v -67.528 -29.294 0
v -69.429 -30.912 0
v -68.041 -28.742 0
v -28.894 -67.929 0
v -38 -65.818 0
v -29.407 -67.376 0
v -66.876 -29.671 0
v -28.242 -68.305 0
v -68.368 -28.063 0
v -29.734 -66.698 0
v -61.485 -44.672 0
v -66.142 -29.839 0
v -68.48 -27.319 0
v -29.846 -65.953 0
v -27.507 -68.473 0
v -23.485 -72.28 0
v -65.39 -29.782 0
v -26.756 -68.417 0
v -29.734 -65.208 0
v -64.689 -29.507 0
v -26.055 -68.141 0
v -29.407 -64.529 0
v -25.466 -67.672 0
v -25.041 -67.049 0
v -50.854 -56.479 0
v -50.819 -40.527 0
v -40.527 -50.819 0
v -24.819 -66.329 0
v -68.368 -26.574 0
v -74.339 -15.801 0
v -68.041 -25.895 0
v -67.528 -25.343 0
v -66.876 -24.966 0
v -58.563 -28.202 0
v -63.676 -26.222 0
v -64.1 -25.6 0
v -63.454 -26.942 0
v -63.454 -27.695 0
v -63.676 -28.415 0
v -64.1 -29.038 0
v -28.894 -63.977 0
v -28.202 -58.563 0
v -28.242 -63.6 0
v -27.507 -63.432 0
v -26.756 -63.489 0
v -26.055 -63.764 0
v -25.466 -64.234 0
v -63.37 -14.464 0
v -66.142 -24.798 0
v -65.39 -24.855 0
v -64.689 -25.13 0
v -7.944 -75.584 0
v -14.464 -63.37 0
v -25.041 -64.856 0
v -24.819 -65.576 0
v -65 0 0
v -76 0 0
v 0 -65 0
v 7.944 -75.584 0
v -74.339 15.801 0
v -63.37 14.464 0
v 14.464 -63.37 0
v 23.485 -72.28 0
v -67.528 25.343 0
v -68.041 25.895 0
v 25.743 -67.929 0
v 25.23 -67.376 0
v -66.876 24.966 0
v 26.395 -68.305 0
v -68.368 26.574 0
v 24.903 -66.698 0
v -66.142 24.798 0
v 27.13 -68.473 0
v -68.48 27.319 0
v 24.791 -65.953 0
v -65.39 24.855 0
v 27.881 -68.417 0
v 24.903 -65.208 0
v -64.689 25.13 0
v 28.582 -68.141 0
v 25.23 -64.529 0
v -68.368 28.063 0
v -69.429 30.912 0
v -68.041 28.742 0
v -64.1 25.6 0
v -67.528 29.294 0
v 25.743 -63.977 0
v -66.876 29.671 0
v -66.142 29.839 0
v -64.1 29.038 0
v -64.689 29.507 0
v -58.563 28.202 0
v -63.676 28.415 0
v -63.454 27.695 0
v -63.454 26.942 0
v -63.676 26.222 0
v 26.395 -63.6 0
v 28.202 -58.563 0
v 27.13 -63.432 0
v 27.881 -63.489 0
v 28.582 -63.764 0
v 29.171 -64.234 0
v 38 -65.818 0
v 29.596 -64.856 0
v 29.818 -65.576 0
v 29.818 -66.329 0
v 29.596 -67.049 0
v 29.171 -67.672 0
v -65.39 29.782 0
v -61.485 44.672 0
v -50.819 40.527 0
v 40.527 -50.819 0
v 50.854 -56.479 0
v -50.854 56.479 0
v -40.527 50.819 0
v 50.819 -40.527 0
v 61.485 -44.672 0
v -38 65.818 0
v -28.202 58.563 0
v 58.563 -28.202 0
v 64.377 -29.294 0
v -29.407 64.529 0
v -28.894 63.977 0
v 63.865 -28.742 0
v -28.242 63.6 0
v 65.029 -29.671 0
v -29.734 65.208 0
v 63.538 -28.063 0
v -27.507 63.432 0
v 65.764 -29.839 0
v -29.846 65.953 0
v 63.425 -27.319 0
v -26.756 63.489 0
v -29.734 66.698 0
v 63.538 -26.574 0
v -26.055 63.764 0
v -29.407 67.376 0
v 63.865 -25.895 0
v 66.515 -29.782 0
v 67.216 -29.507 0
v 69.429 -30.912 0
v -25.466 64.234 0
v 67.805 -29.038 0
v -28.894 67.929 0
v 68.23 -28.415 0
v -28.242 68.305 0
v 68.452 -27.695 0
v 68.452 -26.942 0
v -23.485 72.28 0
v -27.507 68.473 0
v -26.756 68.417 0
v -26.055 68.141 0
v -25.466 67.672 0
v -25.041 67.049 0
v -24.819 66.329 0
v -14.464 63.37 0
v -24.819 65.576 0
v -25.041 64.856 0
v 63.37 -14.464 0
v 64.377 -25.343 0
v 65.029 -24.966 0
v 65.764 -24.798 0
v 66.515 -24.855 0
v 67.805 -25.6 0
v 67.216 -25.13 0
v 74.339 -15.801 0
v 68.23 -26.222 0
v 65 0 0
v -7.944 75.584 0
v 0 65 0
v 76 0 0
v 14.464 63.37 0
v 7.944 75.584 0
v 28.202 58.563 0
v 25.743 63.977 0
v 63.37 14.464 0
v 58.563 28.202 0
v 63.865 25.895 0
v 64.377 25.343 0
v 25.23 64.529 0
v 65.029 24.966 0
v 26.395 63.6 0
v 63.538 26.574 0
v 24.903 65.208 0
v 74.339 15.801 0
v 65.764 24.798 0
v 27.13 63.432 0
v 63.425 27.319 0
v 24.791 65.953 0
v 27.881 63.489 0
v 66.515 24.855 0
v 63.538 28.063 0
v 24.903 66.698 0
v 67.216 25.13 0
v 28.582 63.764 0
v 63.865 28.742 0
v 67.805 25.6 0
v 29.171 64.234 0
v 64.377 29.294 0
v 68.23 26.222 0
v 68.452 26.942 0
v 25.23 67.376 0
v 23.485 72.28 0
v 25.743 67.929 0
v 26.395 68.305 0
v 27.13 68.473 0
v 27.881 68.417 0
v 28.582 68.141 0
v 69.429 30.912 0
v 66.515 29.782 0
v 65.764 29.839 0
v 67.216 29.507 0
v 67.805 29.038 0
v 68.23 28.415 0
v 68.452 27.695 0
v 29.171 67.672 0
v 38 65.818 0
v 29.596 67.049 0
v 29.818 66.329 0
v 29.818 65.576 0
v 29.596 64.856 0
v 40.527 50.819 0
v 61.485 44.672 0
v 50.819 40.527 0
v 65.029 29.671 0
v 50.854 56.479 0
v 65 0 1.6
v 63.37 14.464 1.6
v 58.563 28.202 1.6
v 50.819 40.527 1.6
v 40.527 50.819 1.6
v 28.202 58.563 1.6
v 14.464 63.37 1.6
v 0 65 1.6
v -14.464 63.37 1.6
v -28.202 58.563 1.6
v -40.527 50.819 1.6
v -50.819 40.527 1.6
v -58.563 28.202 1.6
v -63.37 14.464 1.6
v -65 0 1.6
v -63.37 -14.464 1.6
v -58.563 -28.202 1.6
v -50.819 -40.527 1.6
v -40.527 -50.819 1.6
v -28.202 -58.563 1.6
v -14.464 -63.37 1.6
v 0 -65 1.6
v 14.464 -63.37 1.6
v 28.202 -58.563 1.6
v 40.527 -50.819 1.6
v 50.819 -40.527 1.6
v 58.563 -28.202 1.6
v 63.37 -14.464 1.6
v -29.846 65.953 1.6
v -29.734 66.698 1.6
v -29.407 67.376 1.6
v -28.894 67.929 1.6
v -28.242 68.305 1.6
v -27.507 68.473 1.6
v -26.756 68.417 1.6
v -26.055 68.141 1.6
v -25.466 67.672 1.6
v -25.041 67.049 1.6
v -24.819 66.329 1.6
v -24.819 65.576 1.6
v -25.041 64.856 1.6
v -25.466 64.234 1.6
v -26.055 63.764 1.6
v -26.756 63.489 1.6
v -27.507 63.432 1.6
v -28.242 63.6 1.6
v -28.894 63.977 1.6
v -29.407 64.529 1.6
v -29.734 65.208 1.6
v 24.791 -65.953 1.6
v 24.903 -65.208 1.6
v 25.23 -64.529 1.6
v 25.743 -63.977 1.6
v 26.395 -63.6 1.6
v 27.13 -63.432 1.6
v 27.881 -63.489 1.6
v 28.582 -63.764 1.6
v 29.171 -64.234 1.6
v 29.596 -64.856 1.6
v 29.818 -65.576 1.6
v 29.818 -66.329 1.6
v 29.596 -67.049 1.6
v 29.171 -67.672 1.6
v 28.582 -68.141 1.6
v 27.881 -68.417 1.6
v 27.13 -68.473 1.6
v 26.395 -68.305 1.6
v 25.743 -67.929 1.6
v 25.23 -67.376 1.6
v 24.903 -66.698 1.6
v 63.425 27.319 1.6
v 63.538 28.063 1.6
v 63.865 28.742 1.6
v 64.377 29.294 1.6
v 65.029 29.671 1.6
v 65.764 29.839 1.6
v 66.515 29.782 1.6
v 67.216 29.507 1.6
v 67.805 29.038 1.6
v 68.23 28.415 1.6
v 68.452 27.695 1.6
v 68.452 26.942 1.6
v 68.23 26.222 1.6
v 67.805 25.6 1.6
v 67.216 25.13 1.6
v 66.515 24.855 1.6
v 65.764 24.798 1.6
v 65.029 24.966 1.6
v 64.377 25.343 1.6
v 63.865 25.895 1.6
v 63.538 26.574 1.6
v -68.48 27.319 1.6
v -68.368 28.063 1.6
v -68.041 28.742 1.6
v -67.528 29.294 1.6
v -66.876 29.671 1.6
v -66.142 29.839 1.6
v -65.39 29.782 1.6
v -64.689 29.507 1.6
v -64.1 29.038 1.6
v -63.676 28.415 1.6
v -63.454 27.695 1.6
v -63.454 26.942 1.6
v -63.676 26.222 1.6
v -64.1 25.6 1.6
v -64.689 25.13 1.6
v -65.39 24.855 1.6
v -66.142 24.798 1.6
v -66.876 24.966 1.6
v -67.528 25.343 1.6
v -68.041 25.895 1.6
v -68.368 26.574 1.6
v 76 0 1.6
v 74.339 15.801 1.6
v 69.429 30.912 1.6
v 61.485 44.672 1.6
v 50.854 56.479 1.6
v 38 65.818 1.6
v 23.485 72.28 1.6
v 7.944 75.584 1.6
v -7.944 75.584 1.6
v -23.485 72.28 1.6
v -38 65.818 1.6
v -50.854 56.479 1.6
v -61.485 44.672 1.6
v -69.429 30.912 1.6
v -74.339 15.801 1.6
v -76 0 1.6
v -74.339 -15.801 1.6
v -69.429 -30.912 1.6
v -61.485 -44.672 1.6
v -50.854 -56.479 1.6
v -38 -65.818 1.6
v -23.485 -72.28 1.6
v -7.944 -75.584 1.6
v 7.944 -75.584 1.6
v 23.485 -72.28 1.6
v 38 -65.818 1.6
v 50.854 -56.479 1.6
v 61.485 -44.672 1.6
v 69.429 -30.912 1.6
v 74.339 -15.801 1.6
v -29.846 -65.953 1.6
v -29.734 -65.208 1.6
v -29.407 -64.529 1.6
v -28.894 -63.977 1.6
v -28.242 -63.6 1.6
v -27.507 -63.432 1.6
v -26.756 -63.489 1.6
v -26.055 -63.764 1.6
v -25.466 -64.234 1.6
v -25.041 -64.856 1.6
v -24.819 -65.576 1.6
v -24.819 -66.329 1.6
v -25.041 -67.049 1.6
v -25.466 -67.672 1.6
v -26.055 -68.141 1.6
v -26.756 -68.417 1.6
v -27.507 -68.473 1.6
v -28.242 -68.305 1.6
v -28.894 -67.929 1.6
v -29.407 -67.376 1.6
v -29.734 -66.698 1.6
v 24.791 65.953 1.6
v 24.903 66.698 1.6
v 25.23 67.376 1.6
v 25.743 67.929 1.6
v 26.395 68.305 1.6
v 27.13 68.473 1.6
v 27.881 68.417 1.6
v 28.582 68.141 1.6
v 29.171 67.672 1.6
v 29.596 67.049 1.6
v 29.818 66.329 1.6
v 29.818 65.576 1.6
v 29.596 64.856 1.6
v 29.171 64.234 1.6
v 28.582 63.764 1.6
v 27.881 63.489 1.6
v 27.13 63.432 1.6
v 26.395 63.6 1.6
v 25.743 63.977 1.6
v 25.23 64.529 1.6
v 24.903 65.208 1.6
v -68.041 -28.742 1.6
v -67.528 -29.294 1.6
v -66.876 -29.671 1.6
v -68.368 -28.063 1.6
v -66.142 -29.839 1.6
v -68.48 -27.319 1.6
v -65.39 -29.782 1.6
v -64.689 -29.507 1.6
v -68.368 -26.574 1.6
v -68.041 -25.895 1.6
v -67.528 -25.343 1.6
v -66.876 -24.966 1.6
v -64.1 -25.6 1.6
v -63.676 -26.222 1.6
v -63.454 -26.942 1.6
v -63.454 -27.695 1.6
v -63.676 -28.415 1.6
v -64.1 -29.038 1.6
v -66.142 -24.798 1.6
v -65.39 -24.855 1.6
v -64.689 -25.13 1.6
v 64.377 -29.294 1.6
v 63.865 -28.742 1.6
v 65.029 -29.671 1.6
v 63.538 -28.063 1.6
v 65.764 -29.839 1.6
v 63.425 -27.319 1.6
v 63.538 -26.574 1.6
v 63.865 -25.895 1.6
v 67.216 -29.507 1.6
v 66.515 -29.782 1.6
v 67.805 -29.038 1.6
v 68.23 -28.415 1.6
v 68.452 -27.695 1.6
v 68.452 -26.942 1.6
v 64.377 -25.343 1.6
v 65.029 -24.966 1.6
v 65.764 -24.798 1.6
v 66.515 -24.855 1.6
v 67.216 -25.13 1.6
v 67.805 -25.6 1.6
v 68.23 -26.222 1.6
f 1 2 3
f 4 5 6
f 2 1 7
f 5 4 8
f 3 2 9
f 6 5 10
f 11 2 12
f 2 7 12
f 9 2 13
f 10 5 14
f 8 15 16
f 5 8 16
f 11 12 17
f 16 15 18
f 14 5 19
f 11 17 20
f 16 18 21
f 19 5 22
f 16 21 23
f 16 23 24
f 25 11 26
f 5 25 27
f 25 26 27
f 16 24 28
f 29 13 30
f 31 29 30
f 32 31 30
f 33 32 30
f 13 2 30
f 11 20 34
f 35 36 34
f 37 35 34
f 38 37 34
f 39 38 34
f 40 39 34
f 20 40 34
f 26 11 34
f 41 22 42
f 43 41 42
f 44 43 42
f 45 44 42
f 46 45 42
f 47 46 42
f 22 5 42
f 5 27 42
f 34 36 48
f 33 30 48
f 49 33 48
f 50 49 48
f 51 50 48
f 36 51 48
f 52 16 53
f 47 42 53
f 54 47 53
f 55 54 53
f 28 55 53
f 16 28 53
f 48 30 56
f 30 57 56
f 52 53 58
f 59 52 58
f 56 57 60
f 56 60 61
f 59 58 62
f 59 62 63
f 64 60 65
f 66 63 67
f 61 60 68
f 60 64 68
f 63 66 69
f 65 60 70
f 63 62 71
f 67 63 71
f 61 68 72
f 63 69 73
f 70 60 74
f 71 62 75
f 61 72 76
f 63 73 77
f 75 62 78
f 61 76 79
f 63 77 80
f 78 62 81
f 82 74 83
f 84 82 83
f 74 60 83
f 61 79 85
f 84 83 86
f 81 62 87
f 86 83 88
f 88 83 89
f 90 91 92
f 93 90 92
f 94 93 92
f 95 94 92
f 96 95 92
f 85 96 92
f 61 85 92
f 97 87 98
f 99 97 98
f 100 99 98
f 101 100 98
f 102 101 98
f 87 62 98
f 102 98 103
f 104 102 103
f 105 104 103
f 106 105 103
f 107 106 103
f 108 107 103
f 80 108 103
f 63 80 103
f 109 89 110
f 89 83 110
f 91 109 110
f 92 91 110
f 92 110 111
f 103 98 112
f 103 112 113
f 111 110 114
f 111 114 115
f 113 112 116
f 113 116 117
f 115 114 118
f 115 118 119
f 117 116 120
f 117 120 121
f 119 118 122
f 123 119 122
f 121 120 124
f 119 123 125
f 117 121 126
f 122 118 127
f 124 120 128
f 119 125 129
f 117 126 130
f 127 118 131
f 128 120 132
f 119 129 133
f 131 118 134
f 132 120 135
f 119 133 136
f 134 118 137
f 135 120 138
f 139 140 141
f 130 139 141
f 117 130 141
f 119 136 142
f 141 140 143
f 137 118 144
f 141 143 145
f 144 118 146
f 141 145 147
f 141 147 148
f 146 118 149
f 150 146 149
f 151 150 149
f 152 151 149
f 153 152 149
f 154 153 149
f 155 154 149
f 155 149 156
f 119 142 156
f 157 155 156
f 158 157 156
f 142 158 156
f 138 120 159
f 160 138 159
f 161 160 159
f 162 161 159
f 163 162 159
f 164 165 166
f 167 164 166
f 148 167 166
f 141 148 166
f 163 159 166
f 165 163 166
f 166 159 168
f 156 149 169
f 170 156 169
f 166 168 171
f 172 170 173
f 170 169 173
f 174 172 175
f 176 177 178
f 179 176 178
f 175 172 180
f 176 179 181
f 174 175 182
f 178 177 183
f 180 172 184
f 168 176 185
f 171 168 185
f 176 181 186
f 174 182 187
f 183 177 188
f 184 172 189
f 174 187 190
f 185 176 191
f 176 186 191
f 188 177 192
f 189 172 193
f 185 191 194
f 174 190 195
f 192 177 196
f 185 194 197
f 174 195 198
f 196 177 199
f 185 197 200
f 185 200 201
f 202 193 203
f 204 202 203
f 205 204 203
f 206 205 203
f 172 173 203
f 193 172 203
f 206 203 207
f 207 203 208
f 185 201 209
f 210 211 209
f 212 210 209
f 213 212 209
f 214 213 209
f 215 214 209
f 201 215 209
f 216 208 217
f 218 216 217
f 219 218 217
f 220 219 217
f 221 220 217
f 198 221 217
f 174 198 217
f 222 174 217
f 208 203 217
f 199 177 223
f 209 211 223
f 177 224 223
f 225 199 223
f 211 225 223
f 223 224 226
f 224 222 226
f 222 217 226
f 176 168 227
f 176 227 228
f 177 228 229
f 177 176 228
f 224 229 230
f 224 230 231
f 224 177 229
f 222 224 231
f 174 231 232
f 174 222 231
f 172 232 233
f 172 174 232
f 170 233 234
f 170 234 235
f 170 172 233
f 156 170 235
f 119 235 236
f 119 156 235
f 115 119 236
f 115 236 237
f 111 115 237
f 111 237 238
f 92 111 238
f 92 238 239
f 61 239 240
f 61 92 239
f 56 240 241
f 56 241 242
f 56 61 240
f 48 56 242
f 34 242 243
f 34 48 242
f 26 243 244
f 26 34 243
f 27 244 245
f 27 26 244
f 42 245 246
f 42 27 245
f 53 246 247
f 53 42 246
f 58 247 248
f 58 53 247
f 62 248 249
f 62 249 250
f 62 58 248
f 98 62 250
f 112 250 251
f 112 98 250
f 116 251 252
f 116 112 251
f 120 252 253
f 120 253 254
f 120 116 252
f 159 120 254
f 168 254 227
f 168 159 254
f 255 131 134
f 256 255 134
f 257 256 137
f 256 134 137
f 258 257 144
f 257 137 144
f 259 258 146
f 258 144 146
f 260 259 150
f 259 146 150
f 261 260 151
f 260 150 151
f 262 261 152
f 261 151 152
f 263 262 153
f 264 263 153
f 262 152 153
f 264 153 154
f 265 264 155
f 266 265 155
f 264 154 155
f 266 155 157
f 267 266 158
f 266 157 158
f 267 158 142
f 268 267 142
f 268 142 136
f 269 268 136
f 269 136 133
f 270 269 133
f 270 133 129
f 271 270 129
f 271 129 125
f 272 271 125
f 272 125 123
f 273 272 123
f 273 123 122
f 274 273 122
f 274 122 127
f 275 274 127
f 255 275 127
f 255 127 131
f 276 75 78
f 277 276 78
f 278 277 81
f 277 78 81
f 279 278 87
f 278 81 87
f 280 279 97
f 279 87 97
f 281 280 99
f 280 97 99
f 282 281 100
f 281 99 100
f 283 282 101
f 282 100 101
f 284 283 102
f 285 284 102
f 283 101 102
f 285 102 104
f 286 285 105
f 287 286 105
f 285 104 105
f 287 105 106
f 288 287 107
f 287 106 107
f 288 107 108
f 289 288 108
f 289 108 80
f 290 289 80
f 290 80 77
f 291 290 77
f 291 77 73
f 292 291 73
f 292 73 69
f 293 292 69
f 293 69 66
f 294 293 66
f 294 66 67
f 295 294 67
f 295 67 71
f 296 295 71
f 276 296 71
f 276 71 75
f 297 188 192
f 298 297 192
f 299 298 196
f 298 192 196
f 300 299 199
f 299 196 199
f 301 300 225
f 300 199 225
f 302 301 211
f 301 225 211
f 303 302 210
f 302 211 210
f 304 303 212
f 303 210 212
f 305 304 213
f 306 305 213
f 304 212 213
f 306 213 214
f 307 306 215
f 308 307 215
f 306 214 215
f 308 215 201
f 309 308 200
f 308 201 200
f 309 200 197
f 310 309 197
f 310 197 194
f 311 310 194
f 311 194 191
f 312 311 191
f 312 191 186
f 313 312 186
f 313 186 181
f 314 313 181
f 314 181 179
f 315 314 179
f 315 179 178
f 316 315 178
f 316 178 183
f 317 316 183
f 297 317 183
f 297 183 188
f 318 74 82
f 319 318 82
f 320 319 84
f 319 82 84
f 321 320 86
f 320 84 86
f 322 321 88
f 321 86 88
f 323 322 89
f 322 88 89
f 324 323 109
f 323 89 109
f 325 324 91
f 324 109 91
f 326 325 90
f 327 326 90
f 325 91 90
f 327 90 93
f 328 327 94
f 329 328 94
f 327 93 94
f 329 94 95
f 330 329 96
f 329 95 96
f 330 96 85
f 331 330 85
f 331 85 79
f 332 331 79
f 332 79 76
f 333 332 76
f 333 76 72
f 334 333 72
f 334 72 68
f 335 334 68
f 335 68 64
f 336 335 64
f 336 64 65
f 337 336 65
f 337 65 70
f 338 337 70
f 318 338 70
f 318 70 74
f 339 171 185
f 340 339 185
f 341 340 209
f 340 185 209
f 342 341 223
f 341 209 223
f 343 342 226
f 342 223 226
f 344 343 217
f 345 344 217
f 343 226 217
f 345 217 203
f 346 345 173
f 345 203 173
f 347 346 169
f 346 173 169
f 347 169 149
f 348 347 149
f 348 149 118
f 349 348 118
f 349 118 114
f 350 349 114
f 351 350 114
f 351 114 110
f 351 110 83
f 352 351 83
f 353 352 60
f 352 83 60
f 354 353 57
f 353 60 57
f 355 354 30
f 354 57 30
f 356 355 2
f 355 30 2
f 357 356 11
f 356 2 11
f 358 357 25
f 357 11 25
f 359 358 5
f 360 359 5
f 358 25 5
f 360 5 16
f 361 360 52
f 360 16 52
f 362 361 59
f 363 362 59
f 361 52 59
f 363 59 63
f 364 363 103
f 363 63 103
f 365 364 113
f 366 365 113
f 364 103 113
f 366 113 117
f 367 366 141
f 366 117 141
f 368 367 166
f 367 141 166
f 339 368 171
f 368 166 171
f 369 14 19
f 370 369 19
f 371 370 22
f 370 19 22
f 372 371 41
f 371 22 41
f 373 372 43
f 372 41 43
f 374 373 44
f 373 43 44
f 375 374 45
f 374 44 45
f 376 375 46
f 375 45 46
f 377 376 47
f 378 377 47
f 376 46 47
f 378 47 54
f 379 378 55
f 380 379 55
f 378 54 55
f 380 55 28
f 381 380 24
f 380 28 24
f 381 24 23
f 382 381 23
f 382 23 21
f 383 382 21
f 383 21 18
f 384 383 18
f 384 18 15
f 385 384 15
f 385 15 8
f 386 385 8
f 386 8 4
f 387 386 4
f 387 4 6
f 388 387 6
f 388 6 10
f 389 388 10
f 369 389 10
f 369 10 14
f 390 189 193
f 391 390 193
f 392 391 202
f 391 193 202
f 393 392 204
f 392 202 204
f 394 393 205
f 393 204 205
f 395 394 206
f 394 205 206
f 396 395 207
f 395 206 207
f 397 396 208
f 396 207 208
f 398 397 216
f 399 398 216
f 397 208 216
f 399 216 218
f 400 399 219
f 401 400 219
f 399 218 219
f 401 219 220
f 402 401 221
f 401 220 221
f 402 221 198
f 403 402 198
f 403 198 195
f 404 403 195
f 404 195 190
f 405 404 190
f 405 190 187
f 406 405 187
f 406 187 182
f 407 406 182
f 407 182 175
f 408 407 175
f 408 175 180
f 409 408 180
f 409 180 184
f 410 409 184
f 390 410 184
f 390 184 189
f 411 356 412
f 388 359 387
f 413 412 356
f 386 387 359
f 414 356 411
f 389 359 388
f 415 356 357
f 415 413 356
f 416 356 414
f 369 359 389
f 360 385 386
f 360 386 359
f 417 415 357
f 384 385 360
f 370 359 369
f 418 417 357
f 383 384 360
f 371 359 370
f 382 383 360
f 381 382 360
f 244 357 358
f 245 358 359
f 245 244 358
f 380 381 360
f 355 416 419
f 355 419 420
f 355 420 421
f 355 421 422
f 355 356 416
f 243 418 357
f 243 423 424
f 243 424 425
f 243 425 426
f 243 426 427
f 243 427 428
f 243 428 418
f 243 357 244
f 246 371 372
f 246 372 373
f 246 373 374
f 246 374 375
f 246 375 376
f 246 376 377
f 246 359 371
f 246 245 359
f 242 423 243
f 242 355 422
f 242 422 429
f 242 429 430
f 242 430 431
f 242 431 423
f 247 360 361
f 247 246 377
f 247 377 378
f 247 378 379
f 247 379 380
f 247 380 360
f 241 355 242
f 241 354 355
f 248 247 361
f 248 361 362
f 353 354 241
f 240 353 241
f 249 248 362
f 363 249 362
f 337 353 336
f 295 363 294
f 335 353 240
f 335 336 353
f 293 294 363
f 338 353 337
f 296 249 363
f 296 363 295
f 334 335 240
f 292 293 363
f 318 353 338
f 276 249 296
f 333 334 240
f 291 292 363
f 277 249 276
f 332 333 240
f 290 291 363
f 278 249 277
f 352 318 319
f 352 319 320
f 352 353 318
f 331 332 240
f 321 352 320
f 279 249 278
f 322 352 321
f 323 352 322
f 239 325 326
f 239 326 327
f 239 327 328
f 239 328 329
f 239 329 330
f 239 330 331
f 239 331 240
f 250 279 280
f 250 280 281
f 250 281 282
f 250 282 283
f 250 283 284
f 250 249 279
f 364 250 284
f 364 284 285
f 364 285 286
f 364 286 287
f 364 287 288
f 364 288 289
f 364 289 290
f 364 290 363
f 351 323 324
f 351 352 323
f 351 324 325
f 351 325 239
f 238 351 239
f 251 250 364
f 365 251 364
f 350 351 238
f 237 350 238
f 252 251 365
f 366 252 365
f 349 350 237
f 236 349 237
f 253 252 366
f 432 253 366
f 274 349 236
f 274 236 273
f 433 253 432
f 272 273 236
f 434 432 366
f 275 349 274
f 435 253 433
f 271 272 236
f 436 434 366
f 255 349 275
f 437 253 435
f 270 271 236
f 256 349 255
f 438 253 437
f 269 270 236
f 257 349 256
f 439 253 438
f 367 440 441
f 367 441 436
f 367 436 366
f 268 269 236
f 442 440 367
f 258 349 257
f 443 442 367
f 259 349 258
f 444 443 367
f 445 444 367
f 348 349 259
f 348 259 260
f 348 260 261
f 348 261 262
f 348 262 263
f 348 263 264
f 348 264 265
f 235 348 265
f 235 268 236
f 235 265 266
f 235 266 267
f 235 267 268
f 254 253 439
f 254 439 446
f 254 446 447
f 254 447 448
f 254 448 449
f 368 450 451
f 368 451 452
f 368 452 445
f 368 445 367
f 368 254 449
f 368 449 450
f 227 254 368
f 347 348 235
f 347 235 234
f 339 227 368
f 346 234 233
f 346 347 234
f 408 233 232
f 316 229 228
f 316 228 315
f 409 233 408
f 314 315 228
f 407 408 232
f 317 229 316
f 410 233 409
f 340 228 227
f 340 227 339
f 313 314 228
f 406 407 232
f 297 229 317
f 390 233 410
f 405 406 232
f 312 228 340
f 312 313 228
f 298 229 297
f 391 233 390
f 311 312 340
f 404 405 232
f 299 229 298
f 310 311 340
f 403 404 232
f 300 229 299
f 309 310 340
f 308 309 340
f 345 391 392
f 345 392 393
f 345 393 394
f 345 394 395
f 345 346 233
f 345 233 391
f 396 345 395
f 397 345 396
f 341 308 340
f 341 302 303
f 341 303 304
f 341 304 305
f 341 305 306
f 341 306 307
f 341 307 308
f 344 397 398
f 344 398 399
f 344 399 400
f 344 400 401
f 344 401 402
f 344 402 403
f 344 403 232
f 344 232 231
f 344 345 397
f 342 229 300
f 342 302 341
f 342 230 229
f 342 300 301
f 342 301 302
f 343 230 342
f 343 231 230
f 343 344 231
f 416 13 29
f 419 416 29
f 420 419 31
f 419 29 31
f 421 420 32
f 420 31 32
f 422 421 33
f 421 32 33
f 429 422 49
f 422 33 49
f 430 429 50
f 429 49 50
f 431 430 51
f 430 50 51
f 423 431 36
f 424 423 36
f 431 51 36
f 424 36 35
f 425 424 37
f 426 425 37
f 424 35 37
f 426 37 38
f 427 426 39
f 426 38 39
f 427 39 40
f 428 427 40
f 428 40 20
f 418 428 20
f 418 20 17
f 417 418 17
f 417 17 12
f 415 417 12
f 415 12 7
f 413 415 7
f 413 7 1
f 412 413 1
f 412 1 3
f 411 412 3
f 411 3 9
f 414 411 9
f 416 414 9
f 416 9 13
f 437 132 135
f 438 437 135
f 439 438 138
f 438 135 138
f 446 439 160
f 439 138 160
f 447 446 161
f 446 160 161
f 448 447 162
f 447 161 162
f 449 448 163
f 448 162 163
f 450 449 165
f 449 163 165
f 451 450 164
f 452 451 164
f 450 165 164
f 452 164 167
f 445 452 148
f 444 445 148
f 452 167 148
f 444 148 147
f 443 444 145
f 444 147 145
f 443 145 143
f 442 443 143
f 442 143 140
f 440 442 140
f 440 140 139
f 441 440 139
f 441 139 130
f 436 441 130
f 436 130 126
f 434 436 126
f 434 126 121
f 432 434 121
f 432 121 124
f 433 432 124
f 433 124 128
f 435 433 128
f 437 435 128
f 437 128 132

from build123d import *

# Parameters (mm, degrees)
SKETCH1_R                      = 76
SKETCH1_R_2                    = 65
BOSS_EXTRUDE1_DEPTH            = 1.6
F_8_0_199_DIAMETER_HOLE1_D     = 5.0546
F_8_0_199_DIAMETER_HOLE1_DEPTH = 8.481444958
F_8_0_199_DIAMETER_HOLE1_TIP   = 1.518555042


with BuildPart() as part:
    # Sketch1 → Boss-Extrude1 (new body)
    with BuildSketch(Plane.XY):
        Circle(SKETCH1_R)
        Circle(SKETCH1_R_2, mode=Mode.SUBTRACT)
    extrude(amount=BOSS_EXTRUDE1_DEPTH)

    # #8 (0.199) Diameter Hole1
    with Locations(Plane(origin=(-27.318507381, 65.952711024, 1.6), x_dir=(1, 0, 0), z_dir=(0, 0, 1))):
        with Locations((0, 0), (54.637014762, 0), (93.271218405, -38.634203643), (93.271218405, -93.271218405), (54.637014762, -131.905422048), (0, -131.905422048), (-38.634203643, -93.271218405), (-38.634203643, -38.634203643)):
            Hole(F_8_0_199_DIAMETER_HOLE1_D / 2, depth=F_8_0_199_DIAMETER_HOLE1_DEPTH)
            with Locations((0, 0, -(F_8_0_199_DIAMETER_HOLE1_DEPTH + F_8_0_199_DIAMETER_HOLE1_TIP / 2))):  # 118° drill point
                Cone(0, F_8_0_199_DIAMETER_HOLE1_D / 2, F_8_0_199_DIAMETER_HOLE1_TIP, mode=Mode.SUBTRACT)


solid = part.part
